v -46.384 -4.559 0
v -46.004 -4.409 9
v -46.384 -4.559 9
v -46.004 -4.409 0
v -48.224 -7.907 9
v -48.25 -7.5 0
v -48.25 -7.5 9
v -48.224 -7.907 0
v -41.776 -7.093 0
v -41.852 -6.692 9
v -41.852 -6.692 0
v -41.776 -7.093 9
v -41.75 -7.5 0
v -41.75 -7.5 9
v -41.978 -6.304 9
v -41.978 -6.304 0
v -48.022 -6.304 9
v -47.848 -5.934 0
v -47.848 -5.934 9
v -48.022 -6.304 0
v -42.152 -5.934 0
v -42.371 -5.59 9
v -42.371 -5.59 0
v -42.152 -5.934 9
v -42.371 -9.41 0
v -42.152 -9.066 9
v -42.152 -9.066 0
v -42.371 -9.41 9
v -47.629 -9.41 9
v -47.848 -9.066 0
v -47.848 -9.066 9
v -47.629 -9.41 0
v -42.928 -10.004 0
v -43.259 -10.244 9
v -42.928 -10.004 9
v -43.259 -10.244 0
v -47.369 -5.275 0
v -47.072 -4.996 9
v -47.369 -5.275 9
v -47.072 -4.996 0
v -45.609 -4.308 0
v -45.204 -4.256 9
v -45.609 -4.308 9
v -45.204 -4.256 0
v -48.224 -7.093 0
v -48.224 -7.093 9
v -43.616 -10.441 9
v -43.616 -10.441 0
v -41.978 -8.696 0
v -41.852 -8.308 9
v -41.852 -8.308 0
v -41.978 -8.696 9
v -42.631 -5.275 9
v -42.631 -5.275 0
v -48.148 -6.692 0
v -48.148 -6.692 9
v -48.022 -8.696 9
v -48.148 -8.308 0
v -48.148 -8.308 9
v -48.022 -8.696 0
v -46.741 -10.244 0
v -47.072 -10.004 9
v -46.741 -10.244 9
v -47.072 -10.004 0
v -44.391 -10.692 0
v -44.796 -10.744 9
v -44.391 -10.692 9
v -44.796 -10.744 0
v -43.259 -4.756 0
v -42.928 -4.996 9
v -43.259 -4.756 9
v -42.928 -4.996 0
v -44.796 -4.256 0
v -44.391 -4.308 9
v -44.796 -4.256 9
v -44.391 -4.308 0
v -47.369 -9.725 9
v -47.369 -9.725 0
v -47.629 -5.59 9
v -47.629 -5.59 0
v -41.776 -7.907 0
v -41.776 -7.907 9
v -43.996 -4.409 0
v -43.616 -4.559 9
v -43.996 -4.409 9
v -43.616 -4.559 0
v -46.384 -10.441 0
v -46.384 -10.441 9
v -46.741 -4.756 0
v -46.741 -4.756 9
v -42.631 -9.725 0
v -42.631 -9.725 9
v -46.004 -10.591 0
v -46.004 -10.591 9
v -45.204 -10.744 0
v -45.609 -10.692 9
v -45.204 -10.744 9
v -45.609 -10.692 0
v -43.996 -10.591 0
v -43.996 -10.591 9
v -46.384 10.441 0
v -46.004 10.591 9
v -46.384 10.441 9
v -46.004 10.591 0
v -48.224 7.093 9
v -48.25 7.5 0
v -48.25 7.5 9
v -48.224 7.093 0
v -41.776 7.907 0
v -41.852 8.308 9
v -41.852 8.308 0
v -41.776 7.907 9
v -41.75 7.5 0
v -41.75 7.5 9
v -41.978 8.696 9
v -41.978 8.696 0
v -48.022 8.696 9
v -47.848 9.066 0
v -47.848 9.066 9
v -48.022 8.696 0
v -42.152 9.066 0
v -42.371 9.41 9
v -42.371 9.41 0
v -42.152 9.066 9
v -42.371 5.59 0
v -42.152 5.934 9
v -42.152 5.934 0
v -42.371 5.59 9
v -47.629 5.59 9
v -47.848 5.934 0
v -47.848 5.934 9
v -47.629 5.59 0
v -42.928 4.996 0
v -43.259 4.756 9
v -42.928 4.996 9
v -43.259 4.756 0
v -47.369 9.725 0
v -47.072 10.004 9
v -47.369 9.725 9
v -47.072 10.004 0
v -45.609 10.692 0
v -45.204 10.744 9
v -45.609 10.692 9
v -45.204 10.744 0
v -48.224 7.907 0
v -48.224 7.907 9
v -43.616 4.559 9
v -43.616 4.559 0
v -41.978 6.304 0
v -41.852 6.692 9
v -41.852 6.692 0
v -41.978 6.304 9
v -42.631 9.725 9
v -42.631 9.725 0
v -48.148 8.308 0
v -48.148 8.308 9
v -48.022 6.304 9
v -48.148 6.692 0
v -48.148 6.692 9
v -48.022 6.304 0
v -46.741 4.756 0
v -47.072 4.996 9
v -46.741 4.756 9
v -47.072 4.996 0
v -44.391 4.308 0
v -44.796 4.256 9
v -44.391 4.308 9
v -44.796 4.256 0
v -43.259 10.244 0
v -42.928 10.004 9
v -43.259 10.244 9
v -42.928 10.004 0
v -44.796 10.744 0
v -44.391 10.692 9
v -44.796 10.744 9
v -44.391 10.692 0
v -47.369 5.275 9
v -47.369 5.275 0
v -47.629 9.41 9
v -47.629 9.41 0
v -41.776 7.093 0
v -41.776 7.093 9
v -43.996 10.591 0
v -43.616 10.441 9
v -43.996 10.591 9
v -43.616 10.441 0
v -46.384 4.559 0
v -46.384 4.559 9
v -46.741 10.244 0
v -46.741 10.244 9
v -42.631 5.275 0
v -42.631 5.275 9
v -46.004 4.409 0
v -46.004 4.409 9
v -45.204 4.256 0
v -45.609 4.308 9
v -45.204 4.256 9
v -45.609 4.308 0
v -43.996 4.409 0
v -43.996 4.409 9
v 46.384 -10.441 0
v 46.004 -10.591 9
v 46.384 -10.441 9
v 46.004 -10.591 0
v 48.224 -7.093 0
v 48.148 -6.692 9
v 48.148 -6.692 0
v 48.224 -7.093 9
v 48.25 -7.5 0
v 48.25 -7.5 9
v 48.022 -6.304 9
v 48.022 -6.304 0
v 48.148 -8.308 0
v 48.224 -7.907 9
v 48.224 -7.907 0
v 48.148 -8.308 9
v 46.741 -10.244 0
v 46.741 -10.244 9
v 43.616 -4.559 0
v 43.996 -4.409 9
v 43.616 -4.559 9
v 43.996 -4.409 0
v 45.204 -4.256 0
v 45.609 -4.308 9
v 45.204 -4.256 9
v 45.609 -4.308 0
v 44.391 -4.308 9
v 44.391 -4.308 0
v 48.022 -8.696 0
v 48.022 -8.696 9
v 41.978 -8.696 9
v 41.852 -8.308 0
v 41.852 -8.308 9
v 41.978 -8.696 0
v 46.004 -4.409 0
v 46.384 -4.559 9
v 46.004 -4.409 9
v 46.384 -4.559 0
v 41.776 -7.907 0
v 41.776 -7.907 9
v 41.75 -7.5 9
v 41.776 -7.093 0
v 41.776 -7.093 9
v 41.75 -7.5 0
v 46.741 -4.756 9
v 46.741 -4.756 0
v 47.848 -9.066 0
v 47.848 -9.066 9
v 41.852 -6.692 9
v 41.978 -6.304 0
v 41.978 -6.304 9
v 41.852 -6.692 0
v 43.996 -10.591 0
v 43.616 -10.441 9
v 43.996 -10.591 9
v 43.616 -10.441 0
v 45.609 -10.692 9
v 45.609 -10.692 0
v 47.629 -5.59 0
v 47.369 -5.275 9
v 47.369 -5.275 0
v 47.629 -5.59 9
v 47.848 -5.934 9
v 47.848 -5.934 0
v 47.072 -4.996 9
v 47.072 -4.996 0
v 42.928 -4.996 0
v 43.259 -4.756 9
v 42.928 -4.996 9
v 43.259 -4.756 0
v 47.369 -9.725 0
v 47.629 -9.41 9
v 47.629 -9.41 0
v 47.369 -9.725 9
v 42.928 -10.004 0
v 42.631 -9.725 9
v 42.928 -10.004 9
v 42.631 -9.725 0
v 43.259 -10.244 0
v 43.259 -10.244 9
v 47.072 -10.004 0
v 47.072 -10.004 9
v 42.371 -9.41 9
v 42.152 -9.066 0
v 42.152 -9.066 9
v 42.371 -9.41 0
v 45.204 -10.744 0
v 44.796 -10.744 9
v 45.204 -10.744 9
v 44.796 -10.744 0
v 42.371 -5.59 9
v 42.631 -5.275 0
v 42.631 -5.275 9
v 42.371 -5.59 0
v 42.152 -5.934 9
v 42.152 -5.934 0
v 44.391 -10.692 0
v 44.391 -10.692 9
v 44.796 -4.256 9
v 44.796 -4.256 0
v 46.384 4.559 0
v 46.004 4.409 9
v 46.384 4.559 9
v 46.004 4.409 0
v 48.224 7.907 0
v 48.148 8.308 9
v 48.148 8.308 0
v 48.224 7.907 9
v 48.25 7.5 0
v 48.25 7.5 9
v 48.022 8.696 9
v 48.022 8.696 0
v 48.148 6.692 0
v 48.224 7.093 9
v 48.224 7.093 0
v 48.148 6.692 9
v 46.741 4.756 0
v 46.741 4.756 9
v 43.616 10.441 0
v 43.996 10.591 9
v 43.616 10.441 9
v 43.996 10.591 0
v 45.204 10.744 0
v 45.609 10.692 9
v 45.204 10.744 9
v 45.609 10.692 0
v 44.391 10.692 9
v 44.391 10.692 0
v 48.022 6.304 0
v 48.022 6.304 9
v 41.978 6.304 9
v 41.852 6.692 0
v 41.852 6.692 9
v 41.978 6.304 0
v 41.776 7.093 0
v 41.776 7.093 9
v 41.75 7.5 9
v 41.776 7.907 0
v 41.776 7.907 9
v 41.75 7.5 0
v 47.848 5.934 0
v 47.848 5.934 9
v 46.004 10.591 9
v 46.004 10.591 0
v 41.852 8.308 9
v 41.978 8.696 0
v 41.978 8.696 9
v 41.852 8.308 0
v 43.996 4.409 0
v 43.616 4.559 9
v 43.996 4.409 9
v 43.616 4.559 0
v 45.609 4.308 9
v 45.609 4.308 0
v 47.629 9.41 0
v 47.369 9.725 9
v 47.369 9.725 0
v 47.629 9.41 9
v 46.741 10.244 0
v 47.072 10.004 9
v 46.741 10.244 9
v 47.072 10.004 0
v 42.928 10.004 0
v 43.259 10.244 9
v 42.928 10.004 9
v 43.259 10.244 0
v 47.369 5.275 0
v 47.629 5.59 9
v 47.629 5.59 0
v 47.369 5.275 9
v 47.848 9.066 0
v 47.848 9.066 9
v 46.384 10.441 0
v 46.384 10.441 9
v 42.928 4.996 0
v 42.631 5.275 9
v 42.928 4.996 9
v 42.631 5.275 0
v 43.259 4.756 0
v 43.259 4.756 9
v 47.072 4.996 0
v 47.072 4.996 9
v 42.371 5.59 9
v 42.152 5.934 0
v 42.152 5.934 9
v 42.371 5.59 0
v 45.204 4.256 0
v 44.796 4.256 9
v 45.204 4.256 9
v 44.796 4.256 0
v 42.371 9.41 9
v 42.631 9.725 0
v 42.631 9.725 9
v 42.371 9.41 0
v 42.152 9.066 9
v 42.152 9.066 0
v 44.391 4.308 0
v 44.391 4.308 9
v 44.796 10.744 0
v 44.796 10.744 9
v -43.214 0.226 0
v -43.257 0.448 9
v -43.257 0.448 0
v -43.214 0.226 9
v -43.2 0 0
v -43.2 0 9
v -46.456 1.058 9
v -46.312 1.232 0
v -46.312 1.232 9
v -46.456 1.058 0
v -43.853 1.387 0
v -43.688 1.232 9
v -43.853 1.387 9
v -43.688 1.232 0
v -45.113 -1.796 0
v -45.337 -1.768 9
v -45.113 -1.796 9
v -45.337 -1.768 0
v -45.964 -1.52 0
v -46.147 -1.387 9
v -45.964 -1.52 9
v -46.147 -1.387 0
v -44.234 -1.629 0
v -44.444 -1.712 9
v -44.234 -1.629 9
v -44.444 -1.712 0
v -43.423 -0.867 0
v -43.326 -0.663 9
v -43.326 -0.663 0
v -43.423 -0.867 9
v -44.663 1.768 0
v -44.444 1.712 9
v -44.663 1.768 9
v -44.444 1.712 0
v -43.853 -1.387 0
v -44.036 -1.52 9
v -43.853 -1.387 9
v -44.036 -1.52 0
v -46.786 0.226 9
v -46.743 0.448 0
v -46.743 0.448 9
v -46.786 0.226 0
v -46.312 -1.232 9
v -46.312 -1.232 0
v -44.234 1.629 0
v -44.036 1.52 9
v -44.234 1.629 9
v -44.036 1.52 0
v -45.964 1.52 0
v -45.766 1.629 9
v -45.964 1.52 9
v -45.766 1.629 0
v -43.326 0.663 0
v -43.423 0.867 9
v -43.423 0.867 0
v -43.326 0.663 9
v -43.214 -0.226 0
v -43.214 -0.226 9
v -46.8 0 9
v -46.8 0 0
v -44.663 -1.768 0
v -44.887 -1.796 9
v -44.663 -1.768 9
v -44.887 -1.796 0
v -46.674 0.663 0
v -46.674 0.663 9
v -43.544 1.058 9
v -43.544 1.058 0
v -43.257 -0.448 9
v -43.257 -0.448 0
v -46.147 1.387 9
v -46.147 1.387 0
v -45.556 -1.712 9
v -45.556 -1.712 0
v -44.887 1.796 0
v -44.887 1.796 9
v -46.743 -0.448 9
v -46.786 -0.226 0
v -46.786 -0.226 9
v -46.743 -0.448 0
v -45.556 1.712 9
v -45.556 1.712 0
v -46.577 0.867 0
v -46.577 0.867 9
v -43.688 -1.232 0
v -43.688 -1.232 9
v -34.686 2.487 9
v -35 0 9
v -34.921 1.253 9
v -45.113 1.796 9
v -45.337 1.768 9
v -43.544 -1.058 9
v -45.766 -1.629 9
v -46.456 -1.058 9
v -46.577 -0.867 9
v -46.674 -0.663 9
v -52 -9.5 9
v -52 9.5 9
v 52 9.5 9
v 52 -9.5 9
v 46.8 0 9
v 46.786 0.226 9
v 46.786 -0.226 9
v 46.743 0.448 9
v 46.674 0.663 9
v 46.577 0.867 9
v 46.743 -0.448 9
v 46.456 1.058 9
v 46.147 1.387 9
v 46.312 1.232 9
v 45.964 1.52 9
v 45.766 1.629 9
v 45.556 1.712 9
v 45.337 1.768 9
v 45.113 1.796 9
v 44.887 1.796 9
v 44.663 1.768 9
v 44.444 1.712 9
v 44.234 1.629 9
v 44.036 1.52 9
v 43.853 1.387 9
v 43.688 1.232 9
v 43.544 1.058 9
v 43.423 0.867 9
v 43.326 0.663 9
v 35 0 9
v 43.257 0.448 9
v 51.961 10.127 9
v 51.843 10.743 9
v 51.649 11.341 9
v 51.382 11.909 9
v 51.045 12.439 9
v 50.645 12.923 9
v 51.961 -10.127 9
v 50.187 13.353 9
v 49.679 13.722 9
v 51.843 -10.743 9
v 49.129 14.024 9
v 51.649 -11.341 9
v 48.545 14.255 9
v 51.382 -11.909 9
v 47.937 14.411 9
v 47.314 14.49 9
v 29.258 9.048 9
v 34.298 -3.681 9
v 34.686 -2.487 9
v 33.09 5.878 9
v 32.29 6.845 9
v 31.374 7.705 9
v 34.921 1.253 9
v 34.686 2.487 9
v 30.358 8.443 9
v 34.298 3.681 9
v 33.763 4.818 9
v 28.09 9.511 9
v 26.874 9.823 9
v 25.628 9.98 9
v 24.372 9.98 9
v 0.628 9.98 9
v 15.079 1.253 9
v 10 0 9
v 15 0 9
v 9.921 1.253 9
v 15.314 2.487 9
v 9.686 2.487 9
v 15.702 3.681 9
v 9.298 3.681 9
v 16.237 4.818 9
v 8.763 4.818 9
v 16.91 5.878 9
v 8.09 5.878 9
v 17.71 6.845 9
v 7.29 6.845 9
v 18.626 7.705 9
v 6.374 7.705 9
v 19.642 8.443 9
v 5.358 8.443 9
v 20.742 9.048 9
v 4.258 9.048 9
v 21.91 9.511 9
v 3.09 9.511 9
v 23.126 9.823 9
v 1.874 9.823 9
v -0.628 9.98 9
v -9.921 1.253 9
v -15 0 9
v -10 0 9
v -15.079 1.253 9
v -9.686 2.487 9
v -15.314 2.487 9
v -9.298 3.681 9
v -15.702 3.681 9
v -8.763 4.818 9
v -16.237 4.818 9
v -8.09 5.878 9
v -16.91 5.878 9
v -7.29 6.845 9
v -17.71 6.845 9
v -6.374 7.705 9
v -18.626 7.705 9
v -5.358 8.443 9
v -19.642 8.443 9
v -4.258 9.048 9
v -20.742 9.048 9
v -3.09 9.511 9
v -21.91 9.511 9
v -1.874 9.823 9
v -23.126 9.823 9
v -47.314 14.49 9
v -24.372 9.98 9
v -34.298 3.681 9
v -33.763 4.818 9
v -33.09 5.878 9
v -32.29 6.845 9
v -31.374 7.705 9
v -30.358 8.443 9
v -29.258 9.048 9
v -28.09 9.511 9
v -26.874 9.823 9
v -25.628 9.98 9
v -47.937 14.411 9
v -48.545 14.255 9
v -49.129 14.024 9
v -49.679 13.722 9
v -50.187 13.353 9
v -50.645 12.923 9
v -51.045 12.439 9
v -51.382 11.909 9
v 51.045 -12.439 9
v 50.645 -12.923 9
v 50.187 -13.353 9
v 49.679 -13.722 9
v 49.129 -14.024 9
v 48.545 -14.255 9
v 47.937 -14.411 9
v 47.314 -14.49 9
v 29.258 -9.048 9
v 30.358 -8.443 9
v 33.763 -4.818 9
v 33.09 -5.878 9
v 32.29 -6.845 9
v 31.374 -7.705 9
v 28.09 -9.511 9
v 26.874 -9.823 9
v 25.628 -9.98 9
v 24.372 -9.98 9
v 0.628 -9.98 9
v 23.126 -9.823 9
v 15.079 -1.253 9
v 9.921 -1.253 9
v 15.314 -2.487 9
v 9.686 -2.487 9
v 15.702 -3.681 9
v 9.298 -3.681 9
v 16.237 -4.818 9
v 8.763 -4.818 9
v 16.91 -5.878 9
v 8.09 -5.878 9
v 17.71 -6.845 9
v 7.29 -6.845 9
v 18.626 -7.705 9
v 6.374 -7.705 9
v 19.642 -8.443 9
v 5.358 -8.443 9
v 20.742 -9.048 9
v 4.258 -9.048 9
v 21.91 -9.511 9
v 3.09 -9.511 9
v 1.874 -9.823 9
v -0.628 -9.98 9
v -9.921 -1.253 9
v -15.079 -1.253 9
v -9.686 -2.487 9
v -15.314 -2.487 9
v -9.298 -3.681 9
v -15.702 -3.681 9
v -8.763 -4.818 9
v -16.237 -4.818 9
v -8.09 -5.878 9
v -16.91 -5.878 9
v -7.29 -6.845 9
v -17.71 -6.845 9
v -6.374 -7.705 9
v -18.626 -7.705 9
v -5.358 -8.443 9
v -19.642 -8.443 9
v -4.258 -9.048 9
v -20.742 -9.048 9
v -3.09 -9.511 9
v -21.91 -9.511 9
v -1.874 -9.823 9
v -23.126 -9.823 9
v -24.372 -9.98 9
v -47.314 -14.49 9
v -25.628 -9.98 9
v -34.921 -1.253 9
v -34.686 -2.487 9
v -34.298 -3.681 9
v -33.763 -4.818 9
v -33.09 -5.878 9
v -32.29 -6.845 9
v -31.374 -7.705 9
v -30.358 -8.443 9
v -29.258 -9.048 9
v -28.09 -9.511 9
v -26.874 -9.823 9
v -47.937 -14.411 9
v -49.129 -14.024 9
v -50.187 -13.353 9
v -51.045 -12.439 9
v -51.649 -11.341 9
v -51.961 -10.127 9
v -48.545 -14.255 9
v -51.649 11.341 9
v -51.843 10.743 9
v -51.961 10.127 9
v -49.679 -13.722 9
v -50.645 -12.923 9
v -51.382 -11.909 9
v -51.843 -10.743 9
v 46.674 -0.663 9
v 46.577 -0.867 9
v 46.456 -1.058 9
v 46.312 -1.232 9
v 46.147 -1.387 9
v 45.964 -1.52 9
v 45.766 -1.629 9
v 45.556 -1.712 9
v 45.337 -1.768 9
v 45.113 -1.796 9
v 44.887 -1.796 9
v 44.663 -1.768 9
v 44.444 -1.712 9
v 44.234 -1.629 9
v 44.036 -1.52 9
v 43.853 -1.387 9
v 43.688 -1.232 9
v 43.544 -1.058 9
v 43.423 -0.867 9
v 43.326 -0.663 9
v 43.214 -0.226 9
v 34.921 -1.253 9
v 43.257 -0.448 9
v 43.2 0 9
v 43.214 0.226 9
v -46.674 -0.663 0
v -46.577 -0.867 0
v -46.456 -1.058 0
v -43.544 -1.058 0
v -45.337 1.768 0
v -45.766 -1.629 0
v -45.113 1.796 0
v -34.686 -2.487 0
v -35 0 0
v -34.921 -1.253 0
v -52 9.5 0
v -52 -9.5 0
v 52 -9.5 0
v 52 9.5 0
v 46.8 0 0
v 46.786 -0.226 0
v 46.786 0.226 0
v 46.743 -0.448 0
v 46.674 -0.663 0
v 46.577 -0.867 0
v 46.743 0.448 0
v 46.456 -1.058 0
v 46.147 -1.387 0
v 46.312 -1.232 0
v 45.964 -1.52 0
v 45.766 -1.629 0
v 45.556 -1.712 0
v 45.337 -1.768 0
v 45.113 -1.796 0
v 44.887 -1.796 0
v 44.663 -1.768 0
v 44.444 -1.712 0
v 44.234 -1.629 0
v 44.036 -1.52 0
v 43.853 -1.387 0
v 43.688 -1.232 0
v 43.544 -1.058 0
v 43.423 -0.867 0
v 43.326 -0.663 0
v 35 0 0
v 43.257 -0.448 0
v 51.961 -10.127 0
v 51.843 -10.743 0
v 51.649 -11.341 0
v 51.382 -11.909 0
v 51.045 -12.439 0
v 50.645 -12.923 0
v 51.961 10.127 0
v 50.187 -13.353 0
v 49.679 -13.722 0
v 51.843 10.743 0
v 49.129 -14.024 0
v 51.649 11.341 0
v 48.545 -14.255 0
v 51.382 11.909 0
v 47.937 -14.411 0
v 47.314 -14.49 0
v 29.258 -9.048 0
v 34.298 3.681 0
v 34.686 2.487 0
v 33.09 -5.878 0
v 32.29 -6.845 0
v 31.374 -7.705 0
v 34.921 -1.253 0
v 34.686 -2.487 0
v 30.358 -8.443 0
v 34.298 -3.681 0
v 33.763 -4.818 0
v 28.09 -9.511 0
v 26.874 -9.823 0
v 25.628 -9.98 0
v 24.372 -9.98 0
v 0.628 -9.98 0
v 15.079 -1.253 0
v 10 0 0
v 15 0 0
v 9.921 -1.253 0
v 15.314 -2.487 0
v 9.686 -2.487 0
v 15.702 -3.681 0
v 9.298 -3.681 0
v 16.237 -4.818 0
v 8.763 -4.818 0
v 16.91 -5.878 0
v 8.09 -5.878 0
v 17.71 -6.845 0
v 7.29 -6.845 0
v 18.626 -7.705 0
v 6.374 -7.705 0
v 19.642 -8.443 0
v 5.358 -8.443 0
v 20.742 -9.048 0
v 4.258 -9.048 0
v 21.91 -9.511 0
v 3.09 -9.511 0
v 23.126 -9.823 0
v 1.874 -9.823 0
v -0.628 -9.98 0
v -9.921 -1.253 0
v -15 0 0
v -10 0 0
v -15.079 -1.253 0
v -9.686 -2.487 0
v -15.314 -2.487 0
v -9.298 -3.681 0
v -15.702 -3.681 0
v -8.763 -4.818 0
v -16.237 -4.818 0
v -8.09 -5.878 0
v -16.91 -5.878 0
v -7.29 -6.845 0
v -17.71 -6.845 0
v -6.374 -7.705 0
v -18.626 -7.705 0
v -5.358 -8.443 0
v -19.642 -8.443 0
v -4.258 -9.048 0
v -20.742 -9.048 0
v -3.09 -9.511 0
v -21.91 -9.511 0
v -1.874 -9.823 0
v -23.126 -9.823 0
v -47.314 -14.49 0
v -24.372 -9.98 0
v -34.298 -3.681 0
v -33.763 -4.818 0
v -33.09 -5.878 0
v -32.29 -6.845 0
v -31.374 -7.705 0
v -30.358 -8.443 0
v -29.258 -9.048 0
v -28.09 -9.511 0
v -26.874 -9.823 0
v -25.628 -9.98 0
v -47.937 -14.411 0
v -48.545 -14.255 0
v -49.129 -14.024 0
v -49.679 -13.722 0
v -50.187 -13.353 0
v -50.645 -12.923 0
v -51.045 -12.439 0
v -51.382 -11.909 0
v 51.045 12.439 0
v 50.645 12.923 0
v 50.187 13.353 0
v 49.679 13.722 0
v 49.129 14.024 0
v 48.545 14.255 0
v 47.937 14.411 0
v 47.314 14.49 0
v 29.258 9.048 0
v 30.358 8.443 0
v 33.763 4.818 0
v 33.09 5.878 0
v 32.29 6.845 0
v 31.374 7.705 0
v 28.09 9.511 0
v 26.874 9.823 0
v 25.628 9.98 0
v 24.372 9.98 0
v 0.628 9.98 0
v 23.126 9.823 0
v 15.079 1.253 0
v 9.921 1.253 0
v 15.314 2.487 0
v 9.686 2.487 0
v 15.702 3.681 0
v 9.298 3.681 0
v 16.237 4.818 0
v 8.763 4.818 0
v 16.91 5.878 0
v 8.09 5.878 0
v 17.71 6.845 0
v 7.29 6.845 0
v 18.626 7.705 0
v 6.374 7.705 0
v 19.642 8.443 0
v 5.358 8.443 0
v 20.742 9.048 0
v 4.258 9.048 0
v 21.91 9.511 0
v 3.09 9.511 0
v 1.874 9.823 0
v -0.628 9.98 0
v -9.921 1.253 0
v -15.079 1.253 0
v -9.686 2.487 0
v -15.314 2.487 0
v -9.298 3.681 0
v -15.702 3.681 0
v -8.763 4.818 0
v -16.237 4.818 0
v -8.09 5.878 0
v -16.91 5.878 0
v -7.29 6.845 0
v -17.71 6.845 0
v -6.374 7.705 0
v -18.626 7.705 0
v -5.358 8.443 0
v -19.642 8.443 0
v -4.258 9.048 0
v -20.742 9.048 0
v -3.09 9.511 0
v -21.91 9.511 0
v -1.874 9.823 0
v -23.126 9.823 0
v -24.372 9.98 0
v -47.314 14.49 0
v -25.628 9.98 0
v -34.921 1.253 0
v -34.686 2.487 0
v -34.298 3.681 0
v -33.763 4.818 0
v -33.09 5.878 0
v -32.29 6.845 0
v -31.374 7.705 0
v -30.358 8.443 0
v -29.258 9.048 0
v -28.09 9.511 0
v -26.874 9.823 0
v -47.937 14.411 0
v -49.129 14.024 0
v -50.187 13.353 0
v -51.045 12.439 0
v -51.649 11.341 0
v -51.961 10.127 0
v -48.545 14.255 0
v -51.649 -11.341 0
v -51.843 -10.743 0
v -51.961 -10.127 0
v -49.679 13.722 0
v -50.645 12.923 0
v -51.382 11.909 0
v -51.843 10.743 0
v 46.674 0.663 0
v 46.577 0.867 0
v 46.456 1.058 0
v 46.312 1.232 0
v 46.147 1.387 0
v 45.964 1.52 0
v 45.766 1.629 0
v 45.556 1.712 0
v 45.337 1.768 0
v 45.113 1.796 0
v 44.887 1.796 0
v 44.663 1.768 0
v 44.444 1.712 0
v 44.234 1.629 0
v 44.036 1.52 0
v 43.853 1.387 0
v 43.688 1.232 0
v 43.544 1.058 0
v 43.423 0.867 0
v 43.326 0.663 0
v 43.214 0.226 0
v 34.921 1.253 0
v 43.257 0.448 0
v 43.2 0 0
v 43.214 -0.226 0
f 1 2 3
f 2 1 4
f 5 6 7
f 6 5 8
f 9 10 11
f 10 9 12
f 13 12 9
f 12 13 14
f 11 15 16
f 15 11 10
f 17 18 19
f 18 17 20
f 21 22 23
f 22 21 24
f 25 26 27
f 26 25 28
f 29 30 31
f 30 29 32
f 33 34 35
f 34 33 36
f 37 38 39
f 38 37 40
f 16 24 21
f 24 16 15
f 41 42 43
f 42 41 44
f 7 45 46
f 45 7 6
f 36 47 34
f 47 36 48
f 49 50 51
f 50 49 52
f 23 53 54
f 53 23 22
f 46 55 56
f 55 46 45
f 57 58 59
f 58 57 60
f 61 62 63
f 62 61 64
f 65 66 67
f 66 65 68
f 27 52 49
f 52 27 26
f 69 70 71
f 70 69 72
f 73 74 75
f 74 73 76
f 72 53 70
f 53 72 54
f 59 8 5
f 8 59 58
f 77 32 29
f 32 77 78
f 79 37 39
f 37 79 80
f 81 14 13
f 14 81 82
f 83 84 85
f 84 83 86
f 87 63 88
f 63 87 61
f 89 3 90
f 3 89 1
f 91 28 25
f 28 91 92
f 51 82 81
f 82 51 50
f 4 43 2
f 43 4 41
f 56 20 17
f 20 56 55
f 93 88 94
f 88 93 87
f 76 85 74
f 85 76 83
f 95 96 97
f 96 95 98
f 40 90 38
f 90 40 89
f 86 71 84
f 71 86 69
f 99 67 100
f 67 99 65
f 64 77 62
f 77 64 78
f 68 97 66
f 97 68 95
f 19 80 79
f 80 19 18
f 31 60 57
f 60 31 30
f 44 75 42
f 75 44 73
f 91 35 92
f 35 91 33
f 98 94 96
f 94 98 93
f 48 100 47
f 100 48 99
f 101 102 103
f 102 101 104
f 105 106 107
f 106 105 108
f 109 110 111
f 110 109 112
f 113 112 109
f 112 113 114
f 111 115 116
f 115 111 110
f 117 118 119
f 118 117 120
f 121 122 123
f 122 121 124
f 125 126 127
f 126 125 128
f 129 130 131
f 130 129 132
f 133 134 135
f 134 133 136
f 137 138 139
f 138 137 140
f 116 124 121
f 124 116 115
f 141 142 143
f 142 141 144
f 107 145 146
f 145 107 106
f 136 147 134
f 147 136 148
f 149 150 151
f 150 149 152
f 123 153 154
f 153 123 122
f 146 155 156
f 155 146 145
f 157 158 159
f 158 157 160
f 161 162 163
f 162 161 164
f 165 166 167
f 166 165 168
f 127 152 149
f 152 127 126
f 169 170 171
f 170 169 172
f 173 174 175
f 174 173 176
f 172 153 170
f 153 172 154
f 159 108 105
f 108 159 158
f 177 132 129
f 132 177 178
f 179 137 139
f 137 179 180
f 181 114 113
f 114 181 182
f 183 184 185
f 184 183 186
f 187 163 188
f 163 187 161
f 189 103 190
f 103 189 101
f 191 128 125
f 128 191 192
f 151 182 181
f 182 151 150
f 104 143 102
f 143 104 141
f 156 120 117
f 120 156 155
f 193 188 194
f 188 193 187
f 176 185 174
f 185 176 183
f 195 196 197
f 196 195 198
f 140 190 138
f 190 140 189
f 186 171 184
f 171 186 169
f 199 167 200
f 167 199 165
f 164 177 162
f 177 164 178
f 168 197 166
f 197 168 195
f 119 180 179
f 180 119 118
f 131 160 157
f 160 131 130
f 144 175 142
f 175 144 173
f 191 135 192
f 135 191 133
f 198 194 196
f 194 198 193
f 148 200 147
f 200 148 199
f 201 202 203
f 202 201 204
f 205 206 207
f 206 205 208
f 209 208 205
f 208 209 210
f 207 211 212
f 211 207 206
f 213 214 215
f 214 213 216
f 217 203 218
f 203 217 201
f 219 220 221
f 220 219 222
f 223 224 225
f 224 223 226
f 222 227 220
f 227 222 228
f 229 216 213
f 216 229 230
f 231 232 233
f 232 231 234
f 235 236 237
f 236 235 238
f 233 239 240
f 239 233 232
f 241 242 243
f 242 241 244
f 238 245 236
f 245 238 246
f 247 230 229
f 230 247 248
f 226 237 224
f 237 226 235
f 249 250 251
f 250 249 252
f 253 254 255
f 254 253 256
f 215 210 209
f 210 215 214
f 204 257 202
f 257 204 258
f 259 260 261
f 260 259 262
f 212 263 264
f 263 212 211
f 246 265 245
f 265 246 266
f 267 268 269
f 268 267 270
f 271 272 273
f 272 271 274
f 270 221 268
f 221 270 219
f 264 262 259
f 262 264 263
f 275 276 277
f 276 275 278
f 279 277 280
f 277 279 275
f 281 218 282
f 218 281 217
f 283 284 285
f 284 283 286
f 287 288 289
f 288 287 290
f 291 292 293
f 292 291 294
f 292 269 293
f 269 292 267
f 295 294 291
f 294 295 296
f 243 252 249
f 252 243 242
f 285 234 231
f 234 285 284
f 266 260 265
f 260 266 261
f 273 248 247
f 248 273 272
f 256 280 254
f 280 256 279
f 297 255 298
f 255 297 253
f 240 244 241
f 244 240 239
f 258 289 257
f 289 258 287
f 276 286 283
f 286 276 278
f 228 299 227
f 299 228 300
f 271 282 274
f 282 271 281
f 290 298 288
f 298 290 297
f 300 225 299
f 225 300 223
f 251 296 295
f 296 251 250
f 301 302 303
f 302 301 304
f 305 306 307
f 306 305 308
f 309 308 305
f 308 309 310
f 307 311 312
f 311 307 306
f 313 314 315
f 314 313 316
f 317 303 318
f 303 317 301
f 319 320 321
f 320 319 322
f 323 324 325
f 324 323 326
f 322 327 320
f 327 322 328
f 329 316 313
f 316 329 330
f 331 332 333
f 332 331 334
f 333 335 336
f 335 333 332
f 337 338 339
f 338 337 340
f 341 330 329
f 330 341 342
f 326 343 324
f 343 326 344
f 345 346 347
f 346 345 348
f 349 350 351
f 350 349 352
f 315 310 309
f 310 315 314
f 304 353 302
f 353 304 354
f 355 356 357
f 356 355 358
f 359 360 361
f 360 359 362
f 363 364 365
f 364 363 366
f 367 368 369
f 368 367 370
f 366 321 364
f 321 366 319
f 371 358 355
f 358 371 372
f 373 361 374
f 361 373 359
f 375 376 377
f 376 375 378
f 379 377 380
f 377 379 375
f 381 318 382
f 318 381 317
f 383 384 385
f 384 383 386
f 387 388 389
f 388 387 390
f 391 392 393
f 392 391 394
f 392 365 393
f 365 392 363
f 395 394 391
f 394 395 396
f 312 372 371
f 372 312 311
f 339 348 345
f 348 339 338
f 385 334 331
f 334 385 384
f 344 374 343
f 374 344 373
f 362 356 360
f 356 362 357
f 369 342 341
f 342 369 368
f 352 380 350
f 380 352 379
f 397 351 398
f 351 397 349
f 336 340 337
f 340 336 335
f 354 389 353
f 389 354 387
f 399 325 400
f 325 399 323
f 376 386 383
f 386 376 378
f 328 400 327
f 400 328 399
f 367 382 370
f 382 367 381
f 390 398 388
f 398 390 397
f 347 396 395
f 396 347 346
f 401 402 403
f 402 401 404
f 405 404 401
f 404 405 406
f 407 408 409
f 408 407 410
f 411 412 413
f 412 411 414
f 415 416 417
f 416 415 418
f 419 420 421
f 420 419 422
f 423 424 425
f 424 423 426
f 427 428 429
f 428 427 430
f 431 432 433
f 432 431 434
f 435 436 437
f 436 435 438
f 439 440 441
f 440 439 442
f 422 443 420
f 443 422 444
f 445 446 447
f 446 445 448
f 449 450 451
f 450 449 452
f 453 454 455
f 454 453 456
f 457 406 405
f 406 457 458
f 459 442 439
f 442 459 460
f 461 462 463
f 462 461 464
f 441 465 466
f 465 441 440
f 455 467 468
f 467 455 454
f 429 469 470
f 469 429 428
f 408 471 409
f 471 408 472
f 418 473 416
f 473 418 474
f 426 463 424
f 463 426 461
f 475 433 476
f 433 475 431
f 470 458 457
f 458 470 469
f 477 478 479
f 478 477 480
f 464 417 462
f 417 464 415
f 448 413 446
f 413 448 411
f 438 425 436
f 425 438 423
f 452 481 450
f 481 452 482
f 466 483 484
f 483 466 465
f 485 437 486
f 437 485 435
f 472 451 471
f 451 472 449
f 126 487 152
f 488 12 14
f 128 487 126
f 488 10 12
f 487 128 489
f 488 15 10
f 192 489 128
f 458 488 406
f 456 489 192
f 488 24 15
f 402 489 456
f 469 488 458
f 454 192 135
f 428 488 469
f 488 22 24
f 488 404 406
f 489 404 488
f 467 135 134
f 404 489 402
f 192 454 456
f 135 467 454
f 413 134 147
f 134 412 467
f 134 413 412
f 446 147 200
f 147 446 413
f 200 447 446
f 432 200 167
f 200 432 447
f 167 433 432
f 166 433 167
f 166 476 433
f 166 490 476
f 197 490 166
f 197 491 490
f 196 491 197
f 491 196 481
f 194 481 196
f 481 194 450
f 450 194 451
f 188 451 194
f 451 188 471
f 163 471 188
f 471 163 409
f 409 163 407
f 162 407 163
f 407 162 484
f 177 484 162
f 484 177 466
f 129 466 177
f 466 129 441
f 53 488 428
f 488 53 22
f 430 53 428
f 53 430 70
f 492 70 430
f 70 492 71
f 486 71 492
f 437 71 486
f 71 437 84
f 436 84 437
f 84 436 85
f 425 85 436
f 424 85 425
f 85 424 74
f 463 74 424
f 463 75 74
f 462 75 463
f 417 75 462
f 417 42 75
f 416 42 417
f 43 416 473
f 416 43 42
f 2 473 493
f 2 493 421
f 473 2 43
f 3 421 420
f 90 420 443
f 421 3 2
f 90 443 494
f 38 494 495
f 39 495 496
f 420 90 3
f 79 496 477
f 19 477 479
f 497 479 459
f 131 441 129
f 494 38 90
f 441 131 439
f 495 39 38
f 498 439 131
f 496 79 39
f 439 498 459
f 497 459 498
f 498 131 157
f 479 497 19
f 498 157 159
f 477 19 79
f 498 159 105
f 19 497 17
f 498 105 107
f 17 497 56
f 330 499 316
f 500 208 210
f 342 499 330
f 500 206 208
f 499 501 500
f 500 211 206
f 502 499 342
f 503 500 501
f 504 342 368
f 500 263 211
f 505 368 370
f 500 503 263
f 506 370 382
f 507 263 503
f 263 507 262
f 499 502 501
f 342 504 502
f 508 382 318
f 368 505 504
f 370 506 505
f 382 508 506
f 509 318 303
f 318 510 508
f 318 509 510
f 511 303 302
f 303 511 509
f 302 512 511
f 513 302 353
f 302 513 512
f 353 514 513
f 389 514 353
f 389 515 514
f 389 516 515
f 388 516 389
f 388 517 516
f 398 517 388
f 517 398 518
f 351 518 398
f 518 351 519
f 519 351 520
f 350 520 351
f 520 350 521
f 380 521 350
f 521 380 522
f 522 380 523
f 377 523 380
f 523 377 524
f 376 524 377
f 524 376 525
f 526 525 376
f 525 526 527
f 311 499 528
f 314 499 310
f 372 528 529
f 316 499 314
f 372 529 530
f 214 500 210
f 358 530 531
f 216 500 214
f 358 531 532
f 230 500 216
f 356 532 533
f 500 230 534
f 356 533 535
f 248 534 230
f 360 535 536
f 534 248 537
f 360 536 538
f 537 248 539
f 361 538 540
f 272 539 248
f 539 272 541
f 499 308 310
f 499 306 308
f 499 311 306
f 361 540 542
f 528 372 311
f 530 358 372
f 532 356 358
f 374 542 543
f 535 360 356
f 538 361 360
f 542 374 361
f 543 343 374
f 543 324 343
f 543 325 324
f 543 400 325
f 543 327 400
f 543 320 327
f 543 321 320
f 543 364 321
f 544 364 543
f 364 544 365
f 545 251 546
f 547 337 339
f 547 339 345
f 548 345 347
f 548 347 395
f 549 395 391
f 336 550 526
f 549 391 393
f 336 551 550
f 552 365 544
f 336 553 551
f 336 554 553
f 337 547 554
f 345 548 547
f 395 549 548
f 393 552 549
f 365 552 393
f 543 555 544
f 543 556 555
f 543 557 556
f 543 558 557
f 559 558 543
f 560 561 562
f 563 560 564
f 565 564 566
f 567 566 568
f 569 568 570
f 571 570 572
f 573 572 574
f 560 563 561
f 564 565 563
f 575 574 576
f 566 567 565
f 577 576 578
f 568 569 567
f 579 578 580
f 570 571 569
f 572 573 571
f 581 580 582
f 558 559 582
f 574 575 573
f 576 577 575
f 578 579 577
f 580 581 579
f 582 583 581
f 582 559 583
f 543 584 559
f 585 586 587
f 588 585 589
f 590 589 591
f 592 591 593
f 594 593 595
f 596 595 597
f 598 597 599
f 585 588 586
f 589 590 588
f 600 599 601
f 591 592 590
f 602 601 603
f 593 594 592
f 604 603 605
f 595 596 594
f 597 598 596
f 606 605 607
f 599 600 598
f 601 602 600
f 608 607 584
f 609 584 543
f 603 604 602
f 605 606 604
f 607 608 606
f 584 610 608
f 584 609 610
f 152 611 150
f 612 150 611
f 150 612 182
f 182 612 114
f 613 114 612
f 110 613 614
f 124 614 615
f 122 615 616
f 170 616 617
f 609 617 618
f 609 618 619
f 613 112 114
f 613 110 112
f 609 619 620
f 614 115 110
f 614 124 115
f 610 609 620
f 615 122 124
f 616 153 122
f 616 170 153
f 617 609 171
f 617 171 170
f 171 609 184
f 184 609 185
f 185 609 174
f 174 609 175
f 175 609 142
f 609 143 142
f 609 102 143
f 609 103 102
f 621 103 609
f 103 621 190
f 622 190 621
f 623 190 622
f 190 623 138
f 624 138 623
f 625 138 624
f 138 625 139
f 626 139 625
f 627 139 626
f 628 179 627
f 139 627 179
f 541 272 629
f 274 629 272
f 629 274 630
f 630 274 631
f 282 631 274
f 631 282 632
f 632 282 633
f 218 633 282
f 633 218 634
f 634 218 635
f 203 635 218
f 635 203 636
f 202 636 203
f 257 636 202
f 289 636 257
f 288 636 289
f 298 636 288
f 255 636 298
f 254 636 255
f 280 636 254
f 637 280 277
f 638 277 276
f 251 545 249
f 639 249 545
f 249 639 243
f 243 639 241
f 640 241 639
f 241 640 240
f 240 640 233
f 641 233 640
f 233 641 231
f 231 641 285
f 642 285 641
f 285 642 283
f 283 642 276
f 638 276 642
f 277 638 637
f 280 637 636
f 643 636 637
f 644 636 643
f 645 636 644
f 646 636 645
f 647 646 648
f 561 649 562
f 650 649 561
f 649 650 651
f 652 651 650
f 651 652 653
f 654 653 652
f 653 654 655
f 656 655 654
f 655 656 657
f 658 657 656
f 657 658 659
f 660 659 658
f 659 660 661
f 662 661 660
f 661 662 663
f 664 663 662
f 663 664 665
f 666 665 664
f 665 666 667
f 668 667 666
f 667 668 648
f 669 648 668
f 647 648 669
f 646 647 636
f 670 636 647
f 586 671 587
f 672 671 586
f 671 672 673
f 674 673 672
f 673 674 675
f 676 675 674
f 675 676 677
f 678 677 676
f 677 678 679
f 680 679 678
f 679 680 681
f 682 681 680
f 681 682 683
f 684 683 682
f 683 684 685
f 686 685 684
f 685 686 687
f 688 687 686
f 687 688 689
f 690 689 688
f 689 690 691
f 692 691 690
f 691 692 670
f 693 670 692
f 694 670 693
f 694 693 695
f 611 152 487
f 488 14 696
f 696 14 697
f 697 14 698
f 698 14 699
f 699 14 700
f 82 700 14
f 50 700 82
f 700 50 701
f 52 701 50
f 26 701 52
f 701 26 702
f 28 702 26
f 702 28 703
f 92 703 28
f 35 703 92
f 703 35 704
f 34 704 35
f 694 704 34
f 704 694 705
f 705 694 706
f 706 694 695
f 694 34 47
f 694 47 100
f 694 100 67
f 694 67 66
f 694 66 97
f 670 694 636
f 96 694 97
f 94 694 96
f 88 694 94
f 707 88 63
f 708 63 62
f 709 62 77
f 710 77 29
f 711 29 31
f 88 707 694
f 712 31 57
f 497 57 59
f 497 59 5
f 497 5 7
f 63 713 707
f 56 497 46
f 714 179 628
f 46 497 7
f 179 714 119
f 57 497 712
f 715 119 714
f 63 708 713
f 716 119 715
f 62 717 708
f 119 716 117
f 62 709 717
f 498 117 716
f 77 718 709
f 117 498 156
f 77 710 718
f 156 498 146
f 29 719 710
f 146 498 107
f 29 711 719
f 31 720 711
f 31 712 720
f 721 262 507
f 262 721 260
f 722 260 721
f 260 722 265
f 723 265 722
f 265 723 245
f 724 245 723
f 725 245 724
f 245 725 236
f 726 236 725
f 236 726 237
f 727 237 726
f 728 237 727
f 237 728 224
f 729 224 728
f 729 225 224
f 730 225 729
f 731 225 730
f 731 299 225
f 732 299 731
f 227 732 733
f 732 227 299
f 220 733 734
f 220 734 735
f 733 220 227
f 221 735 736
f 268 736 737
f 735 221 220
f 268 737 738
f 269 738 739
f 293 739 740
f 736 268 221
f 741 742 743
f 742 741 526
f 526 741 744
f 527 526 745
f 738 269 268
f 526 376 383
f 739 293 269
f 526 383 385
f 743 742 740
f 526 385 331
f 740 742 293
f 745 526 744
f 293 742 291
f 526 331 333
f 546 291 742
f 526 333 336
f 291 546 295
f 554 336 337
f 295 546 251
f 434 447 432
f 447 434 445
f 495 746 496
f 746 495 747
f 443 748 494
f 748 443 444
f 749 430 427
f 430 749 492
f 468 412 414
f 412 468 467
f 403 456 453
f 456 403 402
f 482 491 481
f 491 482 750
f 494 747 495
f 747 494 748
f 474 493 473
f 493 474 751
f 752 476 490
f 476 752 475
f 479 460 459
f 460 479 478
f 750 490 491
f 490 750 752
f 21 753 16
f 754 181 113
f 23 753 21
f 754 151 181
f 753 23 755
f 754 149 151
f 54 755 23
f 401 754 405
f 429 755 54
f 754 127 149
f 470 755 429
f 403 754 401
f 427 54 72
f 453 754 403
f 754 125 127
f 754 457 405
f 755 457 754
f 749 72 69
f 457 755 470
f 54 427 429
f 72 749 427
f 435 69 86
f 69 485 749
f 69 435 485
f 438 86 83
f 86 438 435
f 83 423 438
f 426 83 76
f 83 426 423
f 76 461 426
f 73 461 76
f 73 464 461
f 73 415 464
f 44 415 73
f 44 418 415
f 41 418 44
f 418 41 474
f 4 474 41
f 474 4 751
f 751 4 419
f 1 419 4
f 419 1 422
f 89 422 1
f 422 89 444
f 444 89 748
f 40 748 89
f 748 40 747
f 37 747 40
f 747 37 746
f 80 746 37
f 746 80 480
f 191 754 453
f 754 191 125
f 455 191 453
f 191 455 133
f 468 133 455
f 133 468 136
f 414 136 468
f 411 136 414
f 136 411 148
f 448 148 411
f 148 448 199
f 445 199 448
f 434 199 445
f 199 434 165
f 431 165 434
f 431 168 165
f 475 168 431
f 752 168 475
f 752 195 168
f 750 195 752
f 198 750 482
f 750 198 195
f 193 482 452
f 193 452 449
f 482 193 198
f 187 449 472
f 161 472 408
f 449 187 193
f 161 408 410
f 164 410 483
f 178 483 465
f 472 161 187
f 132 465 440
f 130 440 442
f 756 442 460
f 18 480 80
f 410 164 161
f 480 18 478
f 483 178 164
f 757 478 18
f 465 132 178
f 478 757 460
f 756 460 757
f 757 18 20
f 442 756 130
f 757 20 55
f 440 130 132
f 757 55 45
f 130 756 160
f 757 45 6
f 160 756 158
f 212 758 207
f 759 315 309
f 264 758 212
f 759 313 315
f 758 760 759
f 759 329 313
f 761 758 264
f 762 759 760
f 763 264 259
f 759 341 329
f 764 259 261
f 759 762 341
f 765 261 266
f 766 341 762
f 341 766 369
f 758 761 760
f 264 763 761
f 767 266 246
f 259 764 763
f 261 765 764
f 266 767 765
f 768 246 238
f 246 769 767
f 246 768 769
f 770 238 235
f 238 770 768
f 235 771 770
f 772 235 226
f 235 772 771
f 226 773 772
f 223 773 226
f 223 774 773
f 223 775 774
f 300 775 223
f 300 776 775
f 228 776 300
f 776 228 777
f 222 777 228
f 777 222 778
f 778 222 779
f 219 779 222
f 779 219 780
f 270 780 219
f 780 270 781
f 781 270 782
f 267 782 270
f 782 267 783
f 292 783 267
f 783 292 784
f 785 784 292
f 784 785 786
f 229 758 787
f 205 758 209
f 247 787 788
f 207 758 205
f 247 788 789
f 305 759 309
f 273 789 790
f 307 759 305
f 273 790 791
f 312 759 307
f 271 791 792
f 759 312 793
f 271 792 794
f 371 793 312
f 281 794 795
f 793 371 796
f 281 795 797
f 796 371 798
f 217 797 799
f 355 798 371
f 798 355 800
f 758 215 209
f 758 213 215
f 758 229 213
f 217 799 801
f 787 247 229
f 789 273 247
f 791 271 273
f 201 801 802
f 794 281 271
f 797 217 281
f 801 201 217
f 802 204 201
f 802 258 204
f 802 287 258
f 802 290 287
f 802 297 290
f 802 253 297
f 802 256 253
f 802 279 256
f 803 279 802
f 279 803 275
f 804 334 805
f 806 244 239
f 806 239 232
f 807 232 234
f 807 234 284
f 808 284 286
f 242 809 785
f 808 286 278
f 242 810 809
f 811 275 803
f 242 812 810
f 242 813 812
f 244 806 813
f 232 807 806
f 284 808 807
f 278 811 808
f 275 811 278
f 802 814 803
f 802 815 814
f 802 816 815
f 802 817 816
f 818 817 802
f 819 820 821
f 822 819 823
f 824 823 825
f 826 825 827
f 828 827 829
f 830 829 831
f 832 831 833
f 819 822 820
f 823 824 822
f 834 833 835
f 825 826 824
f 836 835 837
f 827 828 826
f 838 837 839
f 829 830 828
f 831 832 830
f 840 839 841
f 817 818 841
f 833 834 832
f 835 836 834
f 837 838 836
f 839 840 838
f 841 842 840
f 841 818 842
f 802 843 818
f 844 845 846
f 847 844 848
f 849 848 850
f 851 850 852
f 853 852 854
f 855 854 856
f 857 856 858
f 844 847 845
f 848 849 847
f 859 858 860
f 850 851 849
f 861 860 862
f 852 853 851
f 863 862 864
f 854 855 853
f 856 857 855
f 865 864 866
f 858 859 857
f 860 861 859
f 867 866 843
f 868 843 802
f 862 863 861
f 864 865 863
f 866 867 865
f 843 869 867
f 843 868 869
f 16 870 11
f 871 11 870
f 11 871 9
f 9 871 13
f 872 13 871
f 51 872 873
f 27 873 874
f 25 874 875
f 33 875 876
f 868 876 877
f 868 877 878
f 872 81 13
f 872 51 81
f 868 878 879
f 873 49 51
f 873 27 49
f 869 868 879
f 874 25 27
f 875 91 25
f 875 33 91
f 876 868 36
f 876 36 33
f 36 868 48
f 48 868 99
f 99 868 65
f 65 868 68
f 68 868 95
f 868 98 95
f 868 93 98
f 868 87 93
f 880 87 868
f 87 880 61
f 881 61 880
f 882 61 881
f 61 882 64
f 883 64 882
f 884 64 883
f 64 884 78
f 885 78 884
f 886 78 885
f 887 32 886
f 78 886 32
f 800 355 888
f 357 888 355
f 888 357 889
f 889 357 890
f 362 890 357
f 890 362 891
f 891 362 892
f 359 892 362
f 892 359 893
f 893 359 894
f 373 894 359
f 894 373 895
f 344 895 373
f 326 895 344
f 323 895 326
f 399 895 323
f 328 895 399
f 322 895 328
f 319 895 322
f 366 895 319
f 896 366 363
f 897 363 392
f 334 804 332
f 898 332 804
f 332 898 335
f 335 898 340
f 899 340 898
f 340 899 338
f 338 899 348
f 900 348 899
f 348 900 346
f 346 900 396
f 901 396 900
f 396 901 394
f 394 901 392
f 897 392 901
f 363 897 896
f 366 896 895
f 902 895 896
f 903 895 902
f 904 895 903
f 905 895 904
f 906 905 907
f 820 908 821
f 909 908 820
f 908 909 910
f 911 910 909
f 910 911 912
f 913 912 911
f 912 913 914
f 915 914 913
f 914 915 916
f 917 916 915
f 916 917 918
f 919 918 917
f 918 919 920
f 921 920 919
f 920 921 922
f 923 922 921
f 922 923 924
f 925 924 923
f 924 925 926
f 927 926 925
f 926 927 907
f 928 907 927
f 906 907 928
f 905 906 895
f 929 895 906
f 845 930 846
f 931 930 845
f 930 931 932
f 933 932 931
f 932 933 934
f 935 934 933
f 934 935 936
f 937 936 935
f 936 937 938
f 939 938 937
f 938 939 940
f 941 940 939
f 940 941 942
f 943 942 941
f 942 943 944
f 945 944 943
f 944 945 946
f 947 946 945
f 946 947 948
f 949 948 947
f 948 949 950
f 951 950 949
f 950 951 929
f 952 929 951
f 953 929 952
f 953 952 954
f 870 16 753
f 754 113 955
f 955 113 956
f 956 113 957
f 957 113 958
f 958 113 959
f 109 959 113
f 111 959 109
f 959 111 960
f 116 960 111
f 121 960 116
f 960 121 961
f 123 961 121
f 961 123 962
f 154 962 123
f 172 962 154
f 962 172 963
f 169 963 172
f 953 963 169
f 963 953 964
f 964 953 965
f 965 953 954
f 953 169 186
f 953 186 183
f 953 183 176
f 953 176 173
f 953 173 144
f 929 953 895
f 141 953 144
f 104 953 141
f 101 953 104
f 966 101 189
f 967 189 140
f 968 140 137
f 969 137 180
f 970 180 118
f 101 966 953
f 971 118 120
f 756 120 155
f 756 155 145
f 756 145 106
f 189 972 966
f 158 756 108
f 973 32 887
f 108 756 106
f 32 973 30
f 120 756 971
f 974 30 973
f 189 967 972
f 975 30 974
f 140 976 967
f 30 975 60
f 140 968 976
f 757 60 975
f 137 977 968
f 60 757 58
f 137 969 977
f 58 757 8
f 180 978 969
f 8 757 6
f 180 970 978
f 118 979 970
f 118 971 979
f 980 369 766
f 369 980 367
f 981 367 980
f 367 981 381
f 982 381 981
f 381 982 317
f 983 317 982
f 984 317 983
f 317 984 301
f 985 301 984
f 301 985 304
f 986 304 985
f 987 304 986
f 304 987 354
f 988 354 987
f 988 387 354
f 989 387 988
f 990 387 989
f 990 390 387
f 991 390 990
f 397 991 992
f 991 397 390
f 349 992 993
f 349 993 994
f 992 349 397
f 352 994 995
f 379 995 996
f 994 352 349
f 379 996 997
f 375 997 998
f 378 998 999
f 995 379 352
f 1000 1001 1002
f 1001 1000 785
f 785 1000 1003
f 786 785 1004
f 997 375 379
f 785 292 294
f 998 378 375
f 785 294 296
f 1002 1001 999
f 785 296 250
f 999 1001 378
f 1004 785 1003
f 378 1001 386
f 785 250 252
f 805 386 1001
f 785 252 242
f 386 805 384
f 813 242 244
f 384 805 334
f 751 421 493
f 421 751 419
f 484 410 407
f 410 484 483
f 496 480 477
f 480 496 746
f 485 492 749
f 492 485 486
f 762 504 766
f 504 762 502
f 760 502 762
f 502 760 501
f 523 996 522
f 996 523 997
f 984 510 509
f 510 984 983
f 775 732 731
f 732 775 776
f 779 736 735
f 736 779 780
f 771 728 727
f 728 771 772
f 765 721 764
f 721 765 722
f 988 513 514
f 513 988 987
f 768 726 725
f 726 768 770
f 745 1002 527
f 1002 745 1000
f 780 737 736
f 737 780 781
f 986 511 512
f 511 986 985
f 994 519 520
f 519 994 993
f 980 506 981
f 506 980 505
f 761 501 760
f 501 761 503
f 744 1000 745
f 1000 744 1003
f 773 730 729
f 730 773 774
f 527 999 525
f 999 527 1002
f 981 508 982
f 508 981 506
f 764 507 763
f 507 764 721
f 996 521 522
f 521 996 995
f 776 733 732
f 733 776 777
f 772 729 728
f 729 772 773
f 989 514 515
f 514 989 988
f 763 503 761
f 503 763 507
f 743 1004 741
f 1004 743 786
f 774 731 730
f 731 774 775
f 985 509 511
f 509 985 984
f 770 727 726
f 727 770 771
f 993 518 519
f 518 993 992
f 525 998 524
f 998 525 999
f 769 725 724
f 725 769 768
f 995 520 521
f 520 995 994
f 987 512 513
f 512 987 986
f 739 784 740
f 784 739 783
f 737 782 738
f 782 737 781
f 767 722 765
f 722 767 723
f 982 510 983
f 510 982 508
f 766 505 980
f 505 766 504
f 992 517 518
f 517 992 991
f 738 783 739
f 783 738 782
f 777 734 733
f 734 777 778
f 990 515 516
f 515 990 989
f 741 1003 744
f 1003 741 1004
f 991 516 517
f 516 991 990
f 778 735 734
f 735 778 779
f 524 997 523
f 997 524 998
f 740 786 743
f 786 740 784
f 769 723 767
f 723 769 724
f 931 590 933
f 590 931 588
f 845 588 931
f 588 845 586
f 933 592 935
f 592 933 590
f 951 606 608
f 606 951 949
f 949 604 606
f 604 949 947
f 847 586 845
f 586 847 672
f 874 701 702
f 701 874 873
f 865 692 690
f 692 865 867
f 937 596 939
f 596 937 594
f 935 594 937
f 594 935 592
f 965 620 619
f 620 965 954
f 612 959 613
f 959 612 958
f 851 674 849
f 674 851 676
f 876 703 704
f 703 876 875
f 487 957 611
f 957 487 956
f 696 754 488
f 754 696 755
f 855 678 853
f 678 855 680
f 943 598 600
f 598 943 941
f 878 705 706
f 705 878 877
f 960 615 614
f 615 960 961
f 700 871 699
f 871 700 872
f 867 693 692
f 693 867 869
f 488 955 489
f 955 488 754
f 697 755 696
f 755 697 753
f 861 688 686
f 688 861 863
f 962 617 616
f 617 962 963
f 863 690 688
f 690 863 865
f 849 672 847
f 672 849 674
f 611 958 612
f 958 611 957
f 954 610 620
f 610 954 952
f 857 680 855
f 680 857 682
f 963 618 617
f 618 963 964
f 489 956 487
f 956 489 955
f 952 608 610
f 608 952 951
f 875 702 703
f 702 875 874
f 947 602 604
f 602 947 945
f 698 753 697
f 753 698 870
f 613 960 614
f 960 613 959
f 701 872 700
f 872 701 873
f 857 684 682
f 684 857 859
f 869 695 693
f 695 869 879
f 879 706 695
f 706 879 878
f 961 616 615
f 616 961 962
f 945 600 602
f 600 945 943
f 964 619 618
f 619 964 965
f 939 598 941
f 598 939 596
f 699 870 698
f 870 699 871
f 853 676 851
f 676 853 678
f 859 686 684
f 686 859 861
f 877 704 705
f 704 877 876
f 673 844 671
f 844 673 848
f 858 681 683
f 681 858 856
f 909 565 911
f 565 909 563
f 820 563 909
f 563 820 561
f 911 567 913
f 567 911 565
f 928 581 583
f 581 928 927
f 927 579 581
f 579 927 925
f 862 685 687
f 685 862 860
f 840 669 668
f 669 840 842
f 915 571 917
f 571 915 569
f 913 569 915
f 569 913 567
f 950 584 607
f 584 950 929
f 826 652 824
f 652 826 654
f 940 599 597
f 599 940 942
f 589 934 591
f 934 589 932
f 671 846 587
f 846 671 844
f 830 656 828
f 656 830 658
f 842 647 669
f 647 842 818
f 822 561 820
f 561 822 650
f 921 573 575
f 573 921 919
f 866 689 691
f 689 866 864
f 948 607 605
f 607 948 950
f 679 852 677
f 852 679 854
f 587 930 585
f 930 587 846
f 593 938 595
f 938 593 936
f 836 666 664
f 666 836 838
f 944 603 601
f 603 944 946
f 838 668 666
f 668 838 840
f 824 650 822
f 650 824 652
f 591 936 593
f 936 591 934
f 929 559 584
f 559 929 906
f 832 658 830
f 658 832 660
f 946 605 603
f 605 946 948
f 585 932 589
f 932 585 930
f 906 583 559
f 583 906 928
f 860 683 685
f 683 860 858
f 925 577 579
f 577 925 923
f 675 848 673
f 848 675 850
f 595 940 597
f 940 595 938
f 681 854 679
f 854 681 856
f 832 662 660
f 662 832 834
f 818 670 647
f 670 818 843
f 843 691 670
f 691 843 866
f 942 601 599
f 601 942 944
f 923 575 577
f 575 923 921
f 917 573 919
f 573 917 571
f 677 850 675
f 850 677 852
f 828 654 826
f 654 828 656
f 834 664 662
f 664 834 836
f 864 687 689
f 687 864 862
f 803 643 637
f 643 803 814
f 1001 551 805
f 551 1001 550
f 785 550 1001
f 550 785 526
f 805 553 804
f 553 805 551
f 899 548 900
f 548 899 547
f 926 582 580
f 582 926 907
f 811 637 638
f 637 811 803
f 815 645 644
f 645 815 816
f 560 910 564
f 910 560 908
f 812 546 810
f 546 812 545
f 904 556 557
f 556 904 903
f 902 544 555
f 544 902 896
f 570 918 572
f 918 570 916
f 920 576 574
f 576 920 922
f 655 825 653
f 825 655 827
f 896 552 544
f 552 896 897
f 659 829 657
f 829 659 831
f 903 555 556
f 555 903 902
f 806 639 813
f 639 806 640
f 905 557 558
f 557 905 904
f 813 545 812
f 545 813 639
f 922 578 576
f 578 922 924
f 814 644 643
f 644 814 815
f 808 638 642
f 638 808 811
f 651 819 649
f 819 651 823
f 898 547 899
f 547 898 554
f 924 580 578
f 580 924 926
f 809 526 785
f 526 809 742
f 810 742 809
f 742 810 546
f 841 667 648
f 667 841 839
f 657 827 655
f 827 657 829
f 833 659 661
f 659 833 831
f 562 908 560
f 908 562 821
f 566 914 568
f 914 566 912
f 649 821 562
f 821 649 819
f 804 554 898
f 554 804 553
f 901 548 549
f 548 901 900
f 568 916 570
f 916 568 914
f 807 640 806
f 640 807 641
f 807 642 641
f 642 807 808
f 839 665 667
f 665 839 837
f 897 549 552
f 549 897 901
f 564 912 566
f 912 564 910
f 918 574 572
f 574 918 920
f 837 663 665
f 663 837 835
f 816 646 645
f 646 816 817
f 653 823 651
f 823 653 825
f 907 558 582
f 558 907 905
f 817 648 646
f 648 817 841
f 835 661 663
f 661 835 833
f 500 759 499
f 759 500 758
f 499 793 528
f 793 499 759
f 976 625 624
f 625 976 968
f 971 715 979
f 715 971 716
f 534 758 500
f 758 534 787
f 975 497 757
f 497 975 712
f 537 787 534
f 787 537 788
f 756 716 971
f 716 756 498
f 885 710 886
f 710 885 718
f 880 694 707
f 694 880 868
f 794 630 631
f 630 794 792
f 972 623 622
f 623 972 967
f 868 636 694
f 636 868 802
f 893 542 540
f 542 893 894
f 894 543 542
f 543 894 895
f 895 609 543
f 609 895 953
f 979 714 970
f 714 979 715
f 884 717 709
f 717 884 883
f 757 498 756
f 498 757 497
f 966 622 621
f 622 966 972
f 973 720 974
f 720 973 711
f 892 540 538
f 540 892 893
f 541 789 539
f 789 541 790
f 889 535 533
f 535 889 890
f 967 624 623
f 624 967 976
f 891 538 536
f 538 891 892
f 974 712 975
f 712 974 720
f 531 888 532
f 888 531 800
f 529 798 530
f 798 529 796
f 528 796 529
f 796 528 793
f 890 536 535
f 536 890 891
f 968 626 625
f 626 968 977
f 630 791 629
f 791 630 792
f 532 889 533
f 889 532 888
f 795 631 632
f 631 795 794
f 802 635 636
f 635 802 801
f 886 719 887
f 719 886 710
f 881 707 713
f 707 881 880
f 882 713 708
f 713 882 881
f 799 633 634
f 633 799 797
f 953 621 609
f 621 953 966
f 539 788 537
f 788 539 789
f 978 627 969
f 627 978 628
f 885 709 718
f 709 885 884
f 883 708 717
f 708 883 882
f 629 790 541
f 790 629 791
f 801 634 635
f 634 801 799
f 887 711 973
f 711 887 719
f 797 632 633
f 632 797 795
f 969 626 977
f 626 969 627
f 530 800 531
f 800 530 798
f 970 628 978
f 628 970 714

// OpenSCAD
$fn = 50;


difference() {
	union() {
		hull() {
			translate(v = [-47.0000000000, 9.5000000000, 0]) {
				cylinder(h = 9, r = 5);
			}
			translate(v = [47.0000000000, 9.5000000000, 0]) {
				cylinder(h = 9, r = 5);
			}
			translate(v = [-47.0000000000, -9.5000000000, 0]) {
				cylinder(h = 9, r = 5);
			}
			translate(v = [47.0000000000, -9.5000000000, 0]) {
				cylinder(h = 9, r = 5);
			}
		}
	}
	union() {
		#translate(v = [-45.0000000000, -7.5000000000, 0]) {
			cylinder(h = 9, r = 3.2500000000);
		}
		#translate(v = [-45.0000000000, 7.5000000000, 0]) {
			cylinder(h = 9, r = 3.2500000000);
		}
		#translate(v = [45.0000000000, -7.5000000000, 0]) {
			cylinder(h = 9, r = 3.2500000000);
		}
		#translate(v = [45.0000000000, 7.5000000000, 0]) {
			cylinder(h = 9, r = 3.2500000000);
		}
		#translate(v = [-45.0000000000, -7.5000000000, -100.0000000000]) {
			cylinder(h = 200, r = 3.2500000000);
		}
		#translate(v = [-45.0000000000, 7.5000000000, -100.0000000000]) {
			cylinder(h = 200, r = 3.2500000000);
		}
		#translate(v = [45.0000000000, -7.5000000000, -100.0000000000]) {
			cylinder(h = 200, r = 3.2500000000);
		}
		#translate(v = [45.0000000000, 7.5000000000, -100.0000000000]) {
			cylinder(h = 200, r = 3.2500000000);
		}
		#translate(v = [-45.0000000000, -7.5000000000, 0]) {
			cylinder(h = 9, r = 1.8000000000);
		}
		#translate(v = [-45.0000000000, 0.0000000000, 0]) {
			cylinder(h = 9, r = 1.8000000000);
		}
		#translate(v = [-45.0000000000, 7.5000000000, 0]) {
			cylinder(h = 9, r = 1.8000000000);
		}
		#translate(v = [45.0000000000, -7.5000000000, 0]) {
			cylinder(h = 9, r = 1.8000000000);
		}
		#translate(v = [45.0000000000, 0.0000000000, 0]) {
			cylinder(h = 9, r = 1.8000000000);
		}
		#translate(v = [45.0000000000, 7.5000000000, 0]) {
			cylinder(h = 9, r = 1.8000000000);
		}
		#translate(v = [-45.0000000000, -7.5000000000, 0]) {
			cylinder(h = 9, r = 1.8000000000);
		}
		#translate(v = [-45.0000000000, 0.0000000000, 0]) {
			cylinder(h = 9, r = 1.8000000000);
		}
		#translate(v = [-45.0000000000, 7.5000000000, 0]) {
			cylinder(h = 9, r = 1.8000000000);
		}
		#translate(v = [45.0000000000, -7.5000000000, 0]) {
			cylinder(h = 9, r = 1.8000000000);
		}
		#translate(v = [45.0000000000, 0.0000000000, 0]) {
			cylinder(h = 9, r = 1.8000000000);
		}
		#translate(v = [45.0000000000, 7.5000000000, 0]) {
			cylinder(h = 9, r = 1.8000000000);
		}
		#translate(v = [-45.0000000000, -7.5000000000, 0]) {
			cylinder(h = 9, r = 1.8000000000);
		}
		#translate(v = [-45.0000000000, 0.0000000000, 0]) {
			cylinder(h = 9, r = 1.8000000000);
		}
		#translate(v = [-45.0000000000, 7.5000000000, 0]) {
			cylinder(h = 9, r = 1.8000000000);
		}
		#translate(v = [45.0000000000, -7.5000000000, 0]) {
			cylinder(h = 9, r = 1.8000000000);
		}
		#translate(v = [45.0000000000, 0.0000000000, 0]) {
			cylinder(h = 9, r = 1.8000000000);
		}
		#translate(v = [45.0000000000, 7.5000000000, 0]) {
			cylinder(h = 9, r = 1.8000000000);
		}
		#translate(v = [-25.0000000000, 0, 0]) {
			cylinder(h = 9, r = 10.0000000000);
		}
		#cylinder(h = 9, r = 10.0000000000);
		#translate(v = [25.0000000000, 0, 0]) {
			cylinder(h = 9, r = 10.0000000000);
		}
	}
}
